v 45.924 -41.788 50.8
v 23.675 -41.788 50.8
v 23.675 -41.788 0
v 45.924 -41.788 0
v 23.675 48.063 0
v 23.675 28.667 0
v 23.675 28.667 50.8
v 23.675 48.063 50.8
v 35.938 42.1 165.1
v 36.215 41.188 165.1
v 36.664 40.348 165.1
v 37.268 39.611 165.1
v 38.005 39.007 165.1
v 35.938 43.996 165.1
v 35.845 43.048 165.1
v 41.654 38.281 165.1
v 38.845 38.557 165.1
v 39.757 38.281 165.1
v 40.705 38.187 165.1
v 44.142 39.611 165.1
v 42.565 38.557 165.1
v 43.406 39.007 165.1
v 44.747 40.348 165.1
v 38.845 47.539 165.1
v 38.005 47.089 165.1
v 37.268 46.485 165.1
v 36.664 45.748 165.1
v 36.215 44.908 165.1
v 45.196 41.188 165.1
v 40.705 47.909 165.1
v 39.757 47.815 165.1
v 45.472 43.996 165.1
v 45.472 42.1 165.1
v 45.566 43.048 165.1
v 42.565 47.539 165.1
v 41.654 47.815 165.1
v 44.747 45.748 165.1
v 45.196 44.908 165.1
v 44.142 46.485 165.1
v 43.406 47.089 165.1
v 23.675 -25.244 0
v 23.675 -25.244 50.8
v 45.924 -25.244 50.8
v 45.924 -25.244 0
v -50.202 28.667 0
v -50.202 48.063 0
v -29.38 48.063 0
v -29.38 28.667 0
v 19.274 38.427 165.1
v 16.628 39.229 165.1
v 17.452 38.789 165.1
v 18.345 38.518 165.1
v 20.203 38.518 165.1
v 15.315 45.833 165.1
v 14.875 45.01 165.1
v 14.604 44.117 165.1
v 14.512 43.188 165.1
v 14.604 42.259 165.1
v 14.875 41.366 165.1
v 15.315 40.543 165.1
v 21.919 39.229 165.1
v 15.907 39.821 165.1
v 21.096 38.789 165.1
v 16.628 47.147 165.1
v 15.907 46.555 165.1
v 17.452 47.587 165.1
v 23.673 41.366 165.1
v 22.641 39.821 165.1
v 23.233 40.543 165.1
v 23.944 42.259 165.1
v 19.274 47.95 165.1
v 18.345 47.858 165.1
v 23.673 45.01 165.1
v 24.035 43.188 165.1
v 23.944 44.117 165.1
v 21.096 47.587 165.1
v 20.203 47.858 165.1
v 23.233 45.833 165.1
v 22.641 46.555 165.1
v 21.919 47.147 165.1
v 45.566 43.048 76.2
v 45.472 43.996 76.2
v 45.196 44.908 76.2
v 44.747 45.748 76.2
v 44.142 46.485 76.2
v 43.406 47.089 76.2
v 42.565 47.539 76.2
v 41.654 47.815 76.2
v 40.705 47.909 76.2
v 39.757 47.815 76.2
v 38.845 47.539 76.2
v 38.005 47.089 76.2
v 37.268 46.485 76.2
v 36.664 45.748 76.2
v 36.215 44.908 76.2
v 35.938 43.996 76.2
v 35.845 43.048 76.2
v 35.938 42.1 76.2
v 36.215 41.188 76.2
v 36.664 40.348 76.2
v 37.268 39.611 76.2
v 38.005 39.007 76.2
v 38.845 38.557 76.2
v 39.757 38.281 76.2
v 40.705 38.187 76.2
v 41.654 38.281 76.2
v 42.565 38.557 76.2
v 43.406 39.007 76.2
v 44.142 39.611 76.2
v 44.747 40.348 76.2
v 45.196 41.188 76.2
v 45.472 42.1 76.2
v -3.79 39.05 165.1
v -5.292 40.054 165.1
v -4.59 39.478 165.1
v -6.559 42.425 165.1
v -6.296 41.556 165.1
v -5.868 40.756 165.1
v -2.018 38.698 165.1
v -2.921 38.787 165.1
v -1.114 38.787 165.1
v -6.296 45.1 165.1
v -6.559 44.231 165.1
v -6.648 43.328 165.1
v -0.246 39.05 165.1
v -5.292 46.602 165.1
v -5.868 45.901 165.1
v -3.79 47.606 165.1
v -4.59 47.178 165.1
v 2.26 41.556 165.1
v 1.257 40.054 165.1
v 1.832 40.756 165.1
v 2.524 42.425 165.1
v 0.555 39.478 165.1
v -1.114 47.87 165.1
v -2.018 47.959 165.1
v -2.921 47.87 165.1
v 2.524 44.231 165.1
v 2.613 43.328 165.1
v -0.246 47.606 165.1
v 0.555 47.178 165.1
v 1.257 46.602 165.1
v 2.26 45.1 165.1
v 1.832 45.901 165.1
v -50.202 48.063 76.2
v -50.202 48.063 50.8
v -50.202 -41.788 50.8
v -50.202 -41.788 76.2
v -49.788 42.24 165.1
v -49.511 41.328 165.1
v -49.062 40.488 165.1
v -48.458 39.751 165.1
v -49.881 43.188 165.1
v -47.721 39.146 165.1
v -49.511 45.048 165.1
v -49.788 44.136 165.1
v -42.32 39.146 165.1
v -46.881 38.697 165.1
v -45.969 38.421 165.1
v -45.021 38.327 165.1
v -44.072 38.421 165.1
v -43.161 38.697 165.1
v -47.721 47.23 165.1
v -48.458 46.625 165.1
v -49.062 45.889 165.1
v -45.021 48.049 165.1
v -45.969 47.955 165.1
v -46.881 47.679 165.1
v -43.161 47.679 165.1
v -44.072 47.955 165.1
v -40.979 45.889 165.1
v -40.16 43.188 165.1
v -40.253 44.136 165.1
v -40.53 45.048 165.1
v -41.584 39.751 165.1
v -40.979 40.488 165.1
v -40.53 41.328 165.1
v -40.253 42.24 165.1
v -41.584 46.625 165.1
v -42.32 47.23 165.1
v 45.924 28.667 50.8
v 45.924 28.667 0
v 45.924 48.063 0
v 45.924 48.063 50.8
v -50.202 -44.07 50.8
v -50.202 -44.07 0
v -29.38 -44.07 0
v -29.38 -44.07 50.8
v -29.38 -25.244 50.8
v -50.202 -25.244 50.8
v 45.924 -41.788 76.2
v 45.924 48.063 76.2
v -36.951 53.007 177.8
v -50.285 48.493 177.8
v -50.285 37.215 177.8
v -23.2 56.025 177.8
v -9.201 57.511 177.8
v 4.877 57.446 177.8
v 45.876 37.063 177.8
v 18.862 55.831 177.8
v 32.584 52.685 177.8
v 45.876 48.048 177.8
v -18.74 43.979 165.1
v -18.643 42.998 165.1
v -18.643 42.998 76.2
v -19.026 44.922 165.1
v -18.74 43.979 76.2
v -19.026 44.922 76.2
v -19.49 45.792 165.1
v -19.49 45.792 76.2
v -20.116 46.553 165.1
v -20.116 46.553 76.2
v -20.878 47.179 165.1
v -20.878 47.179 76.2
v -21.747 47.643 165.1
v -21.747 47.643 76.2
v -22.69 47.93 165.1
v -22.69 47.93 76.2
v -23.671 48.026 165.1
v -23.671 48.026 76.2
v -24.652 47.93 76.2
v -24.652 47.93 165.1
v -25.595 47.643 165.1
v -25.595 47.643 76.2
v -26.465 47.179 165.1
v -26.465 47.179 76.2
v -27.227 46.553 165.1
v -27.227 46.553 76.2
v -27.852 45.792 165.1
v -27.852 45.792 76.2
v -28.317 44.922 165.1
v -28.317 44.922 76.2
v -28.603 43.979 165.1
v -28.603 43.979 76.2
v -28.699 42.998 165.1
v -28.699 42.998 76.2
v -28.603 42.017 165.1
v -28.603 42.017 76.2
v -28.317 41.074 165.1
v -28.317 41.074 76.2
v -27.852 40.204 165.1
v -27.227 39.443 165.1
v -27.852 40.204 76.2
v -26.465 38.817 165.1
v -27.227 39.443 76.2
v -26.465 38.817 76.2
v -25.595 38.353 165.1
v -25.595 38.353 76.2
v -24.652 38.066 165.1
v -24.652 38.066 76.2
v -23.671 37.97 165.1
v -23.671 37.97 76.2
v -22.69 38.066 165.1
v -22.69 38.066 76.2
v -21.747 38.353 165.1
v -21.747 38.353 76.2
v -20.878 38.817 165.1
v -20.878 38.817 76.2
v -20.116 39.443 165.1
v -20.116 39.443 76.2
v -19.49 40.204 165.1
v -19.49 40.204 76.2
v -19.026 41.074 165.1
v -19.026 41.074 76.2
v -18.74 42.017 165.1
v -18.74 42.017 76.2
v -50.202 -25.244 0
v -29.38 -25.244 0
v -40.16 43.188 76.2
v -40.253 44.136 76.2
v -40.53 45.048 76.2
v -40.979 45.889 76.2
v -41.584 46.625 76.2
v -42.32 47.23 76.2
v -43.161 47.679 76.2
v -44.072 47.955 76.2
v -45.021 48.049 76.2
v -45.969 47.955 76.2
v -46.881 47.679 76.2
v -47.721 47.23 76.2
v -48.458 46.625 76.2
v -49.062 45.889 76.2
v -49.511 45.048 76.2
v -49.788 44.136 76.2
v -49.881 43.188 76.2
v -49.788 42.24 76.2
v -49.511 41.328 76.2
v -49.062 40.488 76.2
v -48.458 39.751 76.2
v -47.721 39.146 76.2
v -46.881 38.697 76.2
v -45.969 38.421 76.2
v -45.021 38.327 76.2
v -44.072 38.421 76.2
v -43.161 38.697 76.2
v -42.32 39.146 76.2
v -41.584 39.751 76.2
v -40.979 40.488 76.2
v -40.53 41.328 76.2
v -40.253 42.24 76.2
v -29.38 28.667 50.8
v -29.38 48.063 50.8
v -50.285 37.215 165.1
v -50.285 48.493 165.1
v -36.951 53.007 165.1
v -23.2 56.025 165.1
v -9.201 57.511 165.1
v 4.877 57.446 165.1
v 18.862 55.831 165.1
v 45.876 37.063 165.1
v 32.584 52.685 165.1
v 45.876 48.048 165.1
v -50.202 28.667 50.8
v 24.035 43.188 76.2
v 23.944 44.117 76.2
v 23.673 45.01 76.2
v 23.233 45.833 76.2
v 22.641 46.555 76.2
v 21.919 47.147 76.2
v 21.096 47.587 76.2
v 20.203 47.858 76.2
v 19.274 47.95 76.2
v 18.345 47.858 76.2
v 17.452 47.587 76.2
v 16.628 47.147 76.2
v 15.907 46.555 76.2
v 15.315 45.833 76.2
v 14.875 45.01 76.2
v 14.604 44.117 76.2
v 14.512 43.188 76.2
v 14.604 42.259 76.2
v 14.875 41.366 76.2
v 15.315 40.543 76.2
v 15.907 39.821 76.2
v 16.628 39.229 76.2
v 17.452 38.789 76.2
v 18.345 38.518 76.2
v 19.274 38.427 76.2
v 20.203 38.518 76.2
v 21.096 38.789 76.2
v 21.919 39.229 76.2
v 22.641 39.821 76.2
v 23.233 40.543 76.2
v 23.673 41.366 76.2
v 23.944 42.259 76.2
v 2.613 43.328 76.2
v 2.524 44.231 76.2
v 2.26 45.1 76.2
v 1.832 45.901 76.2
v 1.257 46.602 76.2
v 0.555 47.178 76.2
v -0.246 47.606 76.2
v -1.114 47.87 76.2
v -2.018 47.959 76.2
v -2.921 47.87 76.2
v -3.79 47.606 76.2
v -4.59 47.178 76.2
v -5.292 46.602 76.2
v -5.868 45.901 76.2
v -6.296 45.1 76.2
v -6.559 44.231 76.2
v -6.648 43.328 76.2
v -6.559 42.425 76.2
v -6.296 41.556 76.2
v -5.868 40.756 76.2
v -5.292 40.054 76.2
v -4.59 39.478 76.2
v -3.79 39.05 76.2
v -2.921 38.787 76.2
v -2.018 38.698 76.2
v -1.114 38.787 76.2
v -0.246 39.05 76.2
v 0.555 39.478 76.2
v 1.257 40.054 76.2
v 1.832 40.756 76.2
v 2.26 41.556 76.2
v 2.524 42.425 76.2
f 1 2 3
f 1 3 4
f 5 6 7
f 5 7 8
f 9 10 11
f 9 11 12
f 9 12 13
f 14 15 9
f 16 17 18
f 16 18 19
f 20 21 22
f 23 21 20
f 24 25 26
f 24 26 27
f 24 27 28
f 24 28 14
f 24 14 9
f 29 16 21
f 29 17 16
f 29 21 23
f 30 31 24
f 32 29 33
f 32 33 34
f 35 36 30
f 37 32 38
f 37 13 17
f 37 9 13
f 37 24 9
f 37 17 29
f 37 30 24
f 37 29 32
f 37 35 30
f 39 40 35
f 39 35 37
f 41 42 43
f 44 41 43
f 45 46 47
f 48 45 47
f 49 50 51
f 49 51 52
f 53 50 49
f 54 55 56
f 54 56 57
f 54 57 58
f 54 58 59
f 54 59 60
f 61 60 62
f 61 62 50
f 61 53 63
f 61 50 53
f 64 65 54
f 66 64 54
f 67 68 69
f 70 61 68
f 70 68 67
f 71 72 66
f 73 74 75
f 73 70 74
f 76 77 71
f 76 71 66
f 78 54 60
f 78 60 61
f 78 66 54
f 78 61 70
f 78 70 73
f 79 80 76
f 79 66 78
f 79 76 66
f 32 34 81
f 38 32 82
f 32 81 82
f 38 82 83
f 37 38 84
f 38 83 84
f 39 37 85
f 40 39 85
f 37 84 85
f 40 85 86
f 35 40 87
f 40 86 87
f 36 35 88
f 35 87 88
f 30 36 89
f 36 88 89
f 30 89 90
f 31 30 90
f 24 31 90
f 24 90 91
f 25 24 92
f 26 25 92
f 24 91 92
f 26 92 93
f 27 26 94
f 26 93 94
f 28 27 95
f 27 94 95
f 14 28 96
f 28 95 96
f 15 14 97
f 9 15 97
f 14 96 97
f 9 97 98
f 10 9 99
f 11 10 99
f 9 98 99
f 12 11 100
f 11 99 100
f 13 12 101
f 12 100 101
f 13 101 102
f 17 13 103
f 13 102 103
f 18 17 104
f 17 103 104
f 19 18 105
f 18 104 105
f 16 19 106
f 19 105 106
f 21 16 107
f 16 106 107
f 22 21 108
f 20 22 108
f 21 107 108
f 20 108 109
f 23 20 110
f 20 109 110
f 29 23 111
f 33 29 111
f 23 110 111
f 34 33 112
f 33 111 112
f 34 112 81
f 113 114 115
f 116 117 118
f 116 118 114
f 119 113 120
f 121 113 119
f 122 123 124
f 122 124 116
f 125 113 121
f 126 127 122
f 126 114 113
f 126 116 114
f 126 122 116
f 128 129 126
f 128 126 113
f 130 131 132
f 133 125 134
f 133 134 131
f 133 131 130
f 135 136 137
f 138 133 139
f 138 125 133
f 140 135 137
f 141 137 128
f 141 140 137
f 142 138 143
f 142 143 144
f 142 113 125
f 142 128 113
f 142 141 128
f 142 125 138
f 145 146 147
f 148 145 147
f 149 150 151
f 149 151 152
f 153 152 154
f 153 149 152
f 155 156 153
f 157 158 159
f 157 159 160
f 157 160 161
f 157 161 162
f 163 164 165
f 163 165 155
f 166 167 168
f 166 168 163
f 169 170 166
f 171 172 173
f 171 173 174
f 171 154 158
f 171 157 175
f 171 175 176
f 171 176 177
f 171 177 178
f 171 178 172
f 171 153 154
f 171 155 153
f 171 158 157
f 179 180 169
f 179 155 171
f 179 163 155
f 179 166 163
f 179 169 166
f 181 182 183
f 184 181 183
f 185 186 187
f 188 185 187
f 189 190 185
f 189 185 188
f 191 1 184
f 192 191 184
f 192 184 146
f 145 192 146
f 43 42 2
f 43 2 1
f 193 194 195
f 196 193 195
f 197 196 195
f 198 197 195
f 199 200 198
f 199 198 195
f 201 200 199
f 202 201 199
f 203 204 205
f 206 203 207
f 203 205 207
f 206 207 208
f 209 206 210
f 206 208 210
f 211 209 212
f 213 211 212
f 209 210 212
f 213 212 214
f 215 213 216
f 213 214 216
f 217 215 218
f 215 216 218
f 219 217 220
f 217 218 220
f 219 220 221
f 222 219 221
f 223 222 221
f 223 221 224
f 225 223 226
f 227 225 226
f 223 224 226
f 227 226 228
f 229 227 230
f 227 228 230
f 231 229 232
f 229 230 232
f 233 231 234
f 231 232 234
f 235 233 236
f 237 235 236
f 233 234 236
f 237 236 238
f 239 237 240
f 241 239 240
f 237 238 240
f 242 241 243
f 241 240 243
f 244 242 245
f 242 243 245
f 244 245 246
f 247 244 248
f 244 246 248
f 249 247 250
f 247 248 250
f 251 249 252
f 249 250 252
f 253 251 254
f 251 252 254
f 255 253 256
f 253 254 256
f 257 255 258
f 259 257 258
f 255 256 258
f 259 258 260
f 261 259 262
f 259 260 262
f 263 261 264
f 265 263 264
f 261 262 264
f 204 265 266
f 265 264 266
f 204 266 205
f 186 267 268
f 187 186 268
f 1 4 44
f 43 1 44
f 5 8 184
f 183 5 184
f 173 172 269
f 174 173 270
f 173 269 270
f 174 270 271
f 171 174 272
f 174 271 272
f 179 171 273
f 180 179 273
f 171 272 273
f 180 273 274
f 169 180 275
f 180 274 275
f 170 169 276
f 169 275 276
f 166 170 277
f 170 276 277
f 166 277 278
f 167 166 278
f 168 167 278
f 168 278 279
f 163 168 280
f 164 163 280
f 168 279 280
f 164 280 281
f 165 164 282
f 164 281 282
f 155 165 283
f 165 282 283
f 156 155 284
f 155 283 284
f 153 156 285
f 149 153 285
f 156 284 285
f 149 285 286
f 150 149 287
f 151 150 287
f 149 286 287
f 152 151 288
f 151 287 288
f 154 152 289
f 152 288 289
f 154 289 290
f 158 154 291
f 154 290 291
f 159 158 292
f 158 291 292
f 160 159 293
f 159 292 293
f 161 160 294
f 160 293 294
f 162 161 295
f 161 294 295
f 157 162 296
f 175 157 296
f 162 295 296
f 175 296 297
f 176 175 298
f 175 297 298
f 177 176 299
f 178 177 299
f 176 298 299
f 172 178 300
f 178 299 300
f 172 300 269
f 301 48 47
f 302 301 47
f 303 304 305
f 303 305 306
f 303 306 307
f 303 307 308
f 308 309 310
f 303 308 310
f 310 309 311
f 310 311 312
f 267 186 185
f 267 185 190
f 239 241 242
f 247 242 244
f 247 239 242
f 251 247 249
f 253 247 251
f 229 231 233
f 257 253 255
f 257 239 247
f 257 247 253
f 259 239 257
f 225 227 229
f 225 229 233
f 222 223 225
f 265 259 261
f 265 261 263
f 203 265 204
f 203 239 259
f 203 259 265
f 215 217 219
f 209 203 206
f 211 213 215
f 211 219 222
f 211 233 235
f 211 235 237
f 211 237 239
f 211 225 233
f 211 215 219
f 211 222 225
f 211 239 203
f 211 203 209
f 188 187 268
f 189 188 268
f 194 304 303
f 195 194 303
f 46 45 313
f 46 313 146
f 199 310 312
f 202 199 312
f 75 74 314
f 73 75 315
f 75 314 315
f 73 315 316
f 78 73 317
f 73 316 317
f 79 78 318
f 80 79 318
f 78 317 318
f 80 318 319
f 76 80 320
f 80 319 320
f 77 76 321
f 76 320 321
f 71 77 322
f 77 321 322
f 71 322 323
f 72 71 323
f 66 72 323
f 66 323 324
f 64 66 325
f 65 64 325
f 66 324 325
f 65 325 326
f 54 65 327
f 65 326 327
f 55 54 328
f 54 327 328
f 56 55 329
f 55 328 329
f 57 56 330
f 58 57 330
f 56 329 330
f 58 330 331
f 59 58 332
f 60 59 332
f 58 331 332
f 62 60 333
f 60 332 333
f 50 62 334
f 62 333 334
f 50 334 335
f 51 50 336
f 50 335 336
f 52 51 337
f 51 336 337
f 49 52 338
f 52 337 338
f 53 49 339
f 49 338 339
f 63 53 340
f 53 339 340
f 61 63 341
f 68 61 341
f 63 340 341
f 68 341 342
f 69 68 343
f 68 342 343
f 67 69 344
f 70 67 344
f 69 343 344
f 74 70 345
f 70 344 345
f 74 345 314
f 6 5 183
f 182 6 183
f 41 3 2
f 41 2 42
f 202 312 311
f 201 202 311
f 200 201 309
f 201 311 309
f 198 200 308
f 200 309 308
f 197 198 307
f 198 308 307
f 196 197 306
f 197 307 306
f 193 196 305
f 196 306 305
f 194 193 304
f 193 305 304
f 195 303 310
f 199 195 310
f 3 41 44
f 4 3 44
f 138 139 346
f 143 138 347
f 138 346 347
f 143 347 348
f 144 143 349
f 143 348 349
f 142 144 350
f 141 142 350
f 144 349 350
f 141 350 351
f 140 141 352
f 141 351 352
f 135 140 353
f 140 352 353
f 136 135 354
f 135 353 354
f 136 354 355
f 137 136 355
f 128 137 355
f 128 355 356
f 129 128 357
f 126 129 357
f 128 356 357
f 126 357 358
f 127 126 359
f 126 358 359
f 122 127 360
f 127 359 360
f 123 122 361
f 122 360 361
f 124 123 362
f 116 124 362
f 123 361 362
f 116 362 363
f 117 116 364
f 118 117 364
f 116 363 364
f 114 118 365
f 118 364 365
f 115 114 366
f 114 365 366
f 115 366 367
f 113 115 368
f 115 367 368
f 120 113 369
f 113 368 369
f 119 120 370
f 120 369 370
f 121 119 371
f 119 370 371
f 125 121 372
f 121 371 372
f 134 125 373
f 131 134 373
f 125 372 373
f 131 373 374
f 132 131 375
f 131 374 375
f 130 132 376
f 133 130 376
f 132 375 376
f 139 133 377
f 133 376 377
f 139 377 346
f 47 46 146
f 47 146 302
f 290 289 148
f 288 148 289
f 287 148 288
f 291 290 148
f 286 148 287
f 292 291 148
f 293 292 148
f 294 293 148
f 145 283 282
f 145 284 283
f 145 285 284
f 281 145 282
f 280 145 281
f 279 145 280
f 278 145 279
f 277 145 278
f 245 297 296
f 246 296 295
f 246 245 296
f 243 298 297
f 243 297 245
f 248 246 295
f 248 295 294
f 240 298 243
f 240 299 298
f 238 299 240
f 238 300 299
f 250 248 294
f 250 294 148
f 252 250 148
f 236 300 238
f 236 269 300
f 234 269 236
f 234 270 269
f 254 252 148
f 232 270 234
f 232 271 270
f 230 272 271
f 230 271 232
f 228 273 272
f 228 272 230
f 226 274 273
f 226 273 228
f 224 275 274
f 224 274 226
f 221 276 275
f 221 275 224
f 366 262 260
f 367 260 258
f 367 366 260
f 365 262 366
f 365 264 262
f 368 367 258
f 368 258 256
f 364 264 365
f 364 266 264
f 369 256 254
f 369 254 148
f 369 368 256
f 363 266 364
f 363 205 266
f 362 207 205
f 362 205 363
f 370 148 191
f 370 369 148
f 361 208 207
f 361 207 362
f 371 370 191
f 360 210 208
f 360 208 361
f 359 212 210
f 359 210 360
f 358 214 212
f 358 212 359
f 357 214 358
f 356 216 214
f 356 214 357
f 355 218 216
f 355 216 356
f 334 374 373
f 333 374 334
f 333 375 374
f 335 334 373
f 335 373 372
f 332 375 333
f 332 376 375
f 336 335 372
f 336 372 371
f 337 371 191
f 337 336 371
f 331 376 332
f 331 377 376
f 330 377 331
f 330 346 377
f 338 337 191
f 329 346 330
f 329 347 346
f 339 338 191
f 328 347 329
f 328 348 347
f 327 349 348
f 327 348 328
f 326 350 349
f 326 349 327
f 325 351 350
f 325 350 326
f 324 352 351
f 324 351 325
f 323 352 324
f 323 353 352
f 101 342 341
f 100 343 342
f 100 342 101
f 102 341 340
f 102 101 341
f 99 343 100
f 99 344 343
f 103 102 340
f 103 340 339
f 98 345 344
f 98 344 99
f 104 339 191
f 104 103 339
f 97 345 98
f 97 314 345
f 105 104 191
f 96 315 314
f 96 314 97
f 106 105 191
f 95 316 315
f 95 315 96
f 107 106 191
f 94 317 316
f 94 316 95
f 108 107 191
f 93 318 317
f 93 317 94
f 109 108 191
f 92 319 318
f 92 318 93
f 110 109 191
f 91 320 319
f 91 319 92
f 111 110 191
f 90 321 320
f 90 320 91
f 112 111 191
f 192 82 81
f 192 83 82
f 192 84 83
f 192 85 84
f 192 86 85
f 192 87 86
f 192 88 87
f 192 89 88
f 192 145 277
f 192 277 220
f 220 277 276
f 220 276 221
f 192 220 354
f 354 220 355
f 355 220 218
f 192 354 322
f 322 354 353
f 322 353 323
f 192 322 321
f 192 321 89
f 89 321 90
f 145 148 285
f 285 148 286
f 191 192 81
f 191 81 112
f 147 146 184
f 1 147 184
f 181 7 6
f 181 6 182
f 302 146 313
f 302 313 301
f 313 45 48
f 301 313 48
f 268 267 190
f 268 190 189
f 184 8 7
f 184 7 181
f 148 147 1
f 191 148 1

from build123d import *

# Parameters (mm, degrees)
F0_W     = 20.8225678653
F0_H     = 19.3963628262
F1_DEPTH = 50.8
F0_W_2   = 22.2487710416
F0_H_2   = 16.5439583361
F0_H_3   = 18.8258811831
F2_W     = 20.8225678653
F2_H     = 19.3963628262
F3_DEPTH = 25.4
F4_R     = 4.860759116
F4_R_2   = 4.761497945
F4_R_3   = 4.8605562173
F4_R_4   = 4.6304008171
F4_R_5   = 5.0281691991
F5_DEPTH = 88.9
F6_R     = 4.860759116
F7_DEPTH = 12.7


with BuildPart() as f1:
    # F0 (on Top) → F1 (new body)
    with BuildSketch(Plane.XY):
        with Locations((-39.7910708562, 38.3648658171)):
            Rectangle(F0_W, F0_H)
    extrude(amount=F1_DEPTH)


with BuildPart() as f1b:
    # F0 (on Top) → F1, piece 2 (new body)
    with BuildSketch(Plane.XY):
        with Locations((34.7993578762, 38.3648658171)):
            Rectangle(F0_W_2, F0_H)
    extrude(amount=F1_DEPTH)


with BuildPart() as f1c:
    # F0 (on Top) → F1, piece 3 (new body)
    with BuildSketch(Plane.XY):
        with Locations((34.7993578762, -33.5157755762)):
            Rectangle(F0_W_2, F0_H_2)
    extrude(amount=F1_DEPTH)


with BuildPart() as f1d:
    # F0 (on Top) → F1, piece 4 (new body)
    with BuildSketch(Plane.XY):
        with Locations((-39.7910708562, -34.6567369998)):
            Rectangle(F0_W, F0_H_3)
    extrude(amount=F1_DEPTH)


with BuildPart() as f3:
    # F2 (on face) → F3 (new body)
    with BuildSketch(Plane.XY.offset(50.8)):
        Polygon((45.923743397, 48.0630472302), (-29.3797869235, 48.0630472302), (-29.3797869235, 28.666684404), (-50.2023547888, 28.666684404), (-50.2023547888, -41.7877547443), (45.923743397, -41.7877547443), align=None)
        with Locations((-39.7910708562, 38.3648658171)):
            Rectangle(F2_W, F2_H)
    extrude(amount=F3_DEPTH)

    # F4 (on face) → F5 (join)
    with BuildSketch(Plane.XY.offset(76.2)):
        with Locations((-45.0206659734, 43.188072741)):
            Circle(F4_R)
        with Locations((19.273834303, 43.188072741)):
            Circle(F4_R_2)
        with Locations((40.7053343952, 43.0479981005)):
            Circle(F4_R_3)
        with Locations((-2.0175902173, 43.3281473815)):
            Circle(F4_R_4)
        with Locations((-23.671163246, 42.9980009794)):
            Circle(F4_R_5)
    extrude(amount=F5_DEPTH)


with BuildPart() as f7:
    # F6 (on face) → F7 (new body)
    with BuildSketch(Plane.XY.offset(165.1)):
        with BuildLine():
            Line((45.8758132183, 37.0628839766), (45.8758132183, 48.0479659652))
            ThreePointArc((45.8758132183, 48.0479659652), (-2.161263243, 57.6726914558), (-50.2853841197, 48.4930920324))
            Line((-50.2853841197, 48.4930920324), (-50.2853841197, 37.2148050443))
            Line((-50.2853841197, 37.2148050443), (45.8758132183, 37.0628839766))
        make_face()
        with Locations((-45.0206659734, 43.188072741)):
            Circle(F6_R, mode=Mode.SUBTRACT)
        with Locations((-45.0206659734, 43.188072741)):
            Circle(F6_R)
    extrude(amount=F7_DEPTH)


solid = Compound([f1.part, f1b.part, f1c.part, f1d.part, f3.part, f7.part])
